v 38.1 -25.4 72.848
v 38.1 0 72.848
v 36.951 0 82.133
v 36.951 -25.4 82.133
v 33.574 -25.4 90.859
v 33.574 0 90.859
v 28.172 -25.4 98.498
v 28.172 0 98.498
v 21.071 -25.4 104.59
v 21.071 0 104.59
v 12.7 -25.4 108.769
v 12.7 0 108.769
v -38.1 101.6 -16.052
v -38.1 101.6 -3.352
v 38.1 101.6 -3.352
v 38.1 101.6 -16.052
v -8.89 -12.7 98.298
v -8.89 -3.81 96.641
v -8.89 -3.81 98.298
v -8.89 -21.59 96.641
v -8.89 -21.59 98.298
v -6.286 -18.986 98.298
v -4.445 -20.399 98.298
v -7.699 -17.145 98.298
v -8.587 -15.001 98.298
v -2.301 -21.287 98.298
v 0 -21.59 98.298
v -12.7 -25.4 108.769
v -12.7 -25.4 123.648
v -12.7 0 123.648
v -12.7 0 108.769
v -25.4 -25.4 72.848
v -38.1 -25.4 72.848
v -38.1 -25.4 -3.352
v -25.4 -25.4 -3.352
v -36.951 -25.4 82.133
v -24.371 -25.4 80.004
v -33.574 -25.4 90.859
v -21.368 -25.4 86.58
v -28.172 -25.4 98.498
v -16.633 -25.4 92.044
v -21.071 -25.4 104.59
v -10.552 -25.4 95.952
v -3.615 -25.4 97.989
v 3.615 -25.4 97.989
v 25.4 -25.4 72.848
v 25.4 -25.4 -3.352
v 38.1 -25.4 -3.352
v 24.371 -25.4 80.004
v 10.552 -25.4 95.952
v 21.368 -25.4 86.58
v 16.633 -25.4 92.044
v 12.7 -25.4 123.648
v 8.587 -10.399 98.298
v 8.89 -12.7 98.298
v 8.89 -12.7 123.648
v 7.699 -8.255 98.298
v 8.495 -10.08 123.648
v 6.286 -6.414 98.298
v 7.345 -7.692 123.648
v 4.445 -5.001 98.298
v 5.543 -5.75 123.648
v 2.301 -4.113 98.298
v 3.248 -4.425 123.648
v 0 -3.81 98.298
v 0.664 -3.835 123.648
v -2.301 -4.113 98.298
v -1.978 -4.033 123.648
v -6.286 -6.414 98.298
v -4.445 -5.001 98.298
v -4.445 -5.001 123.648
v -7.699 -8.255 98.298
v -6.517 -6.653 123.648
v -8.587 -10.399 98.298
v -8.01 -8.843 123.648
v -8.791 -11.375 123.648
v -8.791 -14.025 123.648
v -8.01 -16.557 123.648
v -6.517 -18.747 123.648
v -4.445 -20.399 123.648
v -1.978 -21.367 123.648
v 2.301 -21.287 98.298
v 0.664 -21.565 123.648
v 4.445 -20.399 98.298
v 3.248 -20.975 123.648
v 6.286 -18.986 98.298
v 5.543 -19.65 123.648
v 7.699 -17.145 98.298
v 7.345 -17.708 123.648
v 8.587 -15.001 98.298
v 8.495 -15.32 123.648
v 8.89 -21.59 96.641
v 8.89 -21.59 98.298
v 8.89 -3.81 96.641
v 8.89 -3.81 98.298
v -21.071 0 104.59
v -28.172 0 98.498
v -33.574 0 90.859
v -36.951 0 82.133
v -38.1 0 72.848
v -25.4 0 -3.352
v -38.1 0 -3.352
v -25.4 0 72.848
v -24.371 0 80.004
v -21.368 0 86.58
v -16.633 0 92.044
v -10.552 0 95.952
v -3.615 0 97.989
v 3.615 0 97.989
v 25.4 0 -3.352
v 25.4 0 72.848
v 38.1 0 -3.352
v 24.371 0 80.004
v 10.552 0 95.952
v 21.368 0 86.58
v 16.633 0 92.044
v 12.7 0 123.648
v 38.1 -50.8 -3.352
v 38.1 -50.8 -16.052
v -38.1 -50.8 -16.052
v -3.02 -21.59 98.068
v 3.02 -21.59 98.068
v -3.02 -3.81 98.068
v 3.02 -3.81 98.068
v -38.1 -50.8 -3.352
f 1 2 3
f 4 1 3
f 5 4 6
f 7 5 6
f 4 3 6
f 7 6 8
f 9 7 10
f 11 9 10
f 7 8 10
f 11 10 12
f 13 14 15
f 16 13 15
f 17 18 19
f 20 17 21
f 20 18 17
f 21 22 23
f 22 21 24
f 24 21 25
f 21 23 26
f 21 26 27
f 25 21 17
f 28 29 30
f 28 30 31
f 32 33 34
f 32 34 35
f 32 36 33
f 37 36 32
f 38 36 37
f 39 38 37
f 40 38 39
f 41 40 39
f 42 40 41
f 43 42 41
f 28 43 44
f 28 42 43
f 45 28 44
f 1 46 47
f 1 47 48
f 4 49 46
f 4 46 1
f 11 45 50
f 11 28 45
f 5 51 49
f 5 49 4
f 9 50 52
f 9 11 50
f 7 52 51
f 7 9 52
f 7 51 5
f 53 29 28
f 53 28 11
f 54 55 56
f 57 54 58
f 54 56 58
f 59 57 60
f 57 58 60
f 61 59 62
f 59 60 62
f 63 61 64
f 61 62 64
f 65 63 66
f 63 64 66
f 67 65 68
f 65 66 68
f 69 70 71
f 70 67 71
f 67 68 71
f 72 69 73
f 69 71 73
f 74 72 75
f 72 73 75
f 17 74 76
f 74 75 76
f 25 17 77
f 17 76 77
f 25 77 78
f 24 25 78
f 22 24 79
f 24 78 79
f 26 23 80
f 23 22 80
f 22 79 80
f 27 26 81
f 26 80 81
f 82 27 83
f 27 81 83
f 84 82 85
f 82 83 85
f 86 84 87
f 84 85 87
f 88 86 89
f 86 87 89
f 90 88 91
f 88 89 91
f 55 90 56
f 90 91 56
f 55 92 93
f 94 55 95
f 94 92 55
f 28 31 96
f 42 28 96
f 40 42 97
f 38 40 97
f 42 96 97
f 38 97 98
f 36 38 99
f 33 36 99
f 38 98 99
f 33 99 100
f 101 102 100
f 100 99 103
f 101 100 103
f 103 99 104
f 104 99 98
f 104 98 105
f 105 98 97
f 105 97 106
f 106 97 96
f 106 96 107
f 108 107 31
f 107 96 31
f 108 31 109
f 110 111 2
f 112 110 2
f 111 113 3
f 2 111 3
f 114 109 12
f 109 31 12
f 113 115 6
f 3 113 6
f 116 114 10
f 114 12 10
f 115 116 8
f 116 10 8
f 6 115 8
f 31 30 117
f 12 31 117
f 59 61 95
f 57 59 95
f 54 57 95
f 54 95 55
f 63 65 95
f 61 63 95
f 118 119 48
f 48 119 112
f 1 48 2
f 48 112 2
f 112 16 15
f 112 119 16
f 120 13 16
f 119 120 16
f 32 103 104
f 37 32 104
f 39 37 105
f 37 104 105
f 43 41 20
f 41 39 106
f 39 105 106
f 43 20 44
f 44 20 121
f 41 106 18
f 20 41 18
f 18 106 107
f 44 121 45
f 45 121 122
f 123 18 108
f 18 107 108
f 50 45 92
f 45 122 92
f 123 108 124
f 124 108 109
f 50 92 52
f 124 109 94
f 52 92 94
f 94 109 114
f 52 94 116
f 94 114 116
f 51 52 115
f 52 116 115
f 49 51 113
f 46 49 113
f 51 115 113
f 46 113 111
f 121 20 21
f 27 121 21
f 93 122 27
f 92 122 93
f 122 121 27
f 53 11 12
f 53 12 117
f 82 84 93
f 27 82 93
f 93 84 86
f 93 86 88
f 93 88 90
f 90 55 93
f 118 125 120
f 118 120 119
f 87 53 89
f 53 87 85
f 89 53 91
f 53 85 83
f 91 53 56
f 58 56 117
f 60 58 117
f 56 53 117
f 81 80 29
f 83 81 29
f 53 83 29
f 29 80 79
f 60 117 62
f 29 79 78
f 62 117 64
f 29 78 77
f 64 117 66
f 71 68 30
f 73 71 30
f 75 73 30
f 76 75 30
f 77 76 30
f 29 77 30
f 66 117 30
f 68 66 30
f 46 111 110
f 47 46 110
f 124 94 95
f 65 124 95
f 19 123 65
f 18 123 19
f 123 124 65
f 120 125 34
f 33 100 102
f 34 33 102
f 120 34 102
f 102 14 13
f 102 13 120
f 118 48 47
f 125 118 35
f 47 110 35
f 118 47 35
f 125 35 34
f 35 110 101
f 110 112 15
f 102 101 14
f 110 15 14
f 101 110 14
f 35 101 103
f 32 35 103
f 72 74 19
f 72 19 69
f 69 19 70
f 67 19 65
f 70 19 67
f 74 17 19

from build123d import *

# Parameters (mm, degrees)
F1_DEPTH = 25.4
F2_R     = 8.89
F3_DEPTH = 97.9802
F5_DEPTH = 98.298
F6_W     = 76.2
F6_H     = 127
F7_DEPTH = 12.7
F9_DEPTH = 25.4


with BuildPart() as f1:
    # F0 (on Front) → F1 (new body)
    with BuildSketch(Plane.XZ):
        with BuildLine():
            ThreePointArc((-25.4, 72.847709), (0, 98.247709), (25.4, 72.847709))
            Line((25.4, 72.847709), (25.4, -3.352291))
            Line((25.4, -3.352291), (38.1, -3.352291))
            Line((38.1, -3.352291), (38.1, 72.847709))
            ThreePointArc((38.1, 72.847709), (31.10852, 94.844754), (12.7, 108.768733))
            Line((12.7, 108.768733), (12.7, 123.647709))
            Line((12.7, 123.647709), (0, 123.647709))
            Line((0, 123.647709), (-12.7, 123.647709))
            Line((-12.7, 123.647709), (-12.7, 108.768733))
            ThreePointArc((-12.7, 108.768733), (-31.10852, 94.844754), (-38.1, 72.847709))
            Line((-38.1, 72.847709), (-38.1, -3.352291))
            Line((-38.1, -3.352291), (-25.4, -3.352291))
            Line((-25.4, -3.352291), (-25.4, 72.847709))
        make_face()
    extrude(amount=F1_DEPTH)

    # F2 (on face) → F3 (cut)
    with BuildSketch(Plane.XY.offset(123.647709)):
        with Locations((0, -12.7)):
            Circle(F2_R)
    extrude(amount=-F3_DEPTH, mode=Mode.SUBTRACT)

    # F4 (on Top) → F5 (cut)
    with BuildSketch(Plane.XY):
        with BuildLine():
            Line((8.89, -21.59), (8.89, -12.7))
            ThreePointArc((8.89, -12.7), (6.286179, -18.986179), (0, -21.59))
            Line((0, -21.59), (8.89, -21.59))
        make_face()
        with BuildLine():
            ThreePointArc((0, -3.81), (6.286179, -6.413821), (8.89, -12.7))
            Line((8.89, -12.7), (8.89, -3.81))
            Line((8.89, -3.81), (0, -3.81))
        make_face()
        with BuildLine():
            ThreePointArc((-8.89, -12.7), (-6.286179, -6.413821), (0, -3.81))
            Line((0, -3.81), (-8.89, -3.81))
            Line((-8.89, -3.81), (-8.89, -12.7))
        make_face()
        with BuildLine():
            Line((-8.89, -21.59), (0, -21.59))
            ThreePointArc((0, -21.59), (-6.286179, -18.986179), (-8.89, -12.7))
            Line((-8.89, -12.7), (-8.89, -21.59))
        make_face()
    extrude(amount=F5_DEPTH, mode=Mode.SUBTRACT)

    # F6 (on face) → F7 (join)
    with BuildSketch(Plane(origin=(0, 0, -3.352291), x_dir=(1, 0, 0), z_dir=(0, 0, -1))):
        with Locations((0, -38.1)):
            Rectangle(F6_W, F6_H)
    extrude(amount=F7_DEPTH)

    # F8 (on face) → F9 (join)
    with BuildSketch(Plane.XZ.offset(25.4)):
        Polygon((0, -16.052291), (38.1, -16.052291), (38.1, -3.352291), (0, -3.352291), (-38.1, -3.352291), (-38.1, -16.052291), align=None)
    extrude(amount=F9_DEPTH)


solid = f1.part
